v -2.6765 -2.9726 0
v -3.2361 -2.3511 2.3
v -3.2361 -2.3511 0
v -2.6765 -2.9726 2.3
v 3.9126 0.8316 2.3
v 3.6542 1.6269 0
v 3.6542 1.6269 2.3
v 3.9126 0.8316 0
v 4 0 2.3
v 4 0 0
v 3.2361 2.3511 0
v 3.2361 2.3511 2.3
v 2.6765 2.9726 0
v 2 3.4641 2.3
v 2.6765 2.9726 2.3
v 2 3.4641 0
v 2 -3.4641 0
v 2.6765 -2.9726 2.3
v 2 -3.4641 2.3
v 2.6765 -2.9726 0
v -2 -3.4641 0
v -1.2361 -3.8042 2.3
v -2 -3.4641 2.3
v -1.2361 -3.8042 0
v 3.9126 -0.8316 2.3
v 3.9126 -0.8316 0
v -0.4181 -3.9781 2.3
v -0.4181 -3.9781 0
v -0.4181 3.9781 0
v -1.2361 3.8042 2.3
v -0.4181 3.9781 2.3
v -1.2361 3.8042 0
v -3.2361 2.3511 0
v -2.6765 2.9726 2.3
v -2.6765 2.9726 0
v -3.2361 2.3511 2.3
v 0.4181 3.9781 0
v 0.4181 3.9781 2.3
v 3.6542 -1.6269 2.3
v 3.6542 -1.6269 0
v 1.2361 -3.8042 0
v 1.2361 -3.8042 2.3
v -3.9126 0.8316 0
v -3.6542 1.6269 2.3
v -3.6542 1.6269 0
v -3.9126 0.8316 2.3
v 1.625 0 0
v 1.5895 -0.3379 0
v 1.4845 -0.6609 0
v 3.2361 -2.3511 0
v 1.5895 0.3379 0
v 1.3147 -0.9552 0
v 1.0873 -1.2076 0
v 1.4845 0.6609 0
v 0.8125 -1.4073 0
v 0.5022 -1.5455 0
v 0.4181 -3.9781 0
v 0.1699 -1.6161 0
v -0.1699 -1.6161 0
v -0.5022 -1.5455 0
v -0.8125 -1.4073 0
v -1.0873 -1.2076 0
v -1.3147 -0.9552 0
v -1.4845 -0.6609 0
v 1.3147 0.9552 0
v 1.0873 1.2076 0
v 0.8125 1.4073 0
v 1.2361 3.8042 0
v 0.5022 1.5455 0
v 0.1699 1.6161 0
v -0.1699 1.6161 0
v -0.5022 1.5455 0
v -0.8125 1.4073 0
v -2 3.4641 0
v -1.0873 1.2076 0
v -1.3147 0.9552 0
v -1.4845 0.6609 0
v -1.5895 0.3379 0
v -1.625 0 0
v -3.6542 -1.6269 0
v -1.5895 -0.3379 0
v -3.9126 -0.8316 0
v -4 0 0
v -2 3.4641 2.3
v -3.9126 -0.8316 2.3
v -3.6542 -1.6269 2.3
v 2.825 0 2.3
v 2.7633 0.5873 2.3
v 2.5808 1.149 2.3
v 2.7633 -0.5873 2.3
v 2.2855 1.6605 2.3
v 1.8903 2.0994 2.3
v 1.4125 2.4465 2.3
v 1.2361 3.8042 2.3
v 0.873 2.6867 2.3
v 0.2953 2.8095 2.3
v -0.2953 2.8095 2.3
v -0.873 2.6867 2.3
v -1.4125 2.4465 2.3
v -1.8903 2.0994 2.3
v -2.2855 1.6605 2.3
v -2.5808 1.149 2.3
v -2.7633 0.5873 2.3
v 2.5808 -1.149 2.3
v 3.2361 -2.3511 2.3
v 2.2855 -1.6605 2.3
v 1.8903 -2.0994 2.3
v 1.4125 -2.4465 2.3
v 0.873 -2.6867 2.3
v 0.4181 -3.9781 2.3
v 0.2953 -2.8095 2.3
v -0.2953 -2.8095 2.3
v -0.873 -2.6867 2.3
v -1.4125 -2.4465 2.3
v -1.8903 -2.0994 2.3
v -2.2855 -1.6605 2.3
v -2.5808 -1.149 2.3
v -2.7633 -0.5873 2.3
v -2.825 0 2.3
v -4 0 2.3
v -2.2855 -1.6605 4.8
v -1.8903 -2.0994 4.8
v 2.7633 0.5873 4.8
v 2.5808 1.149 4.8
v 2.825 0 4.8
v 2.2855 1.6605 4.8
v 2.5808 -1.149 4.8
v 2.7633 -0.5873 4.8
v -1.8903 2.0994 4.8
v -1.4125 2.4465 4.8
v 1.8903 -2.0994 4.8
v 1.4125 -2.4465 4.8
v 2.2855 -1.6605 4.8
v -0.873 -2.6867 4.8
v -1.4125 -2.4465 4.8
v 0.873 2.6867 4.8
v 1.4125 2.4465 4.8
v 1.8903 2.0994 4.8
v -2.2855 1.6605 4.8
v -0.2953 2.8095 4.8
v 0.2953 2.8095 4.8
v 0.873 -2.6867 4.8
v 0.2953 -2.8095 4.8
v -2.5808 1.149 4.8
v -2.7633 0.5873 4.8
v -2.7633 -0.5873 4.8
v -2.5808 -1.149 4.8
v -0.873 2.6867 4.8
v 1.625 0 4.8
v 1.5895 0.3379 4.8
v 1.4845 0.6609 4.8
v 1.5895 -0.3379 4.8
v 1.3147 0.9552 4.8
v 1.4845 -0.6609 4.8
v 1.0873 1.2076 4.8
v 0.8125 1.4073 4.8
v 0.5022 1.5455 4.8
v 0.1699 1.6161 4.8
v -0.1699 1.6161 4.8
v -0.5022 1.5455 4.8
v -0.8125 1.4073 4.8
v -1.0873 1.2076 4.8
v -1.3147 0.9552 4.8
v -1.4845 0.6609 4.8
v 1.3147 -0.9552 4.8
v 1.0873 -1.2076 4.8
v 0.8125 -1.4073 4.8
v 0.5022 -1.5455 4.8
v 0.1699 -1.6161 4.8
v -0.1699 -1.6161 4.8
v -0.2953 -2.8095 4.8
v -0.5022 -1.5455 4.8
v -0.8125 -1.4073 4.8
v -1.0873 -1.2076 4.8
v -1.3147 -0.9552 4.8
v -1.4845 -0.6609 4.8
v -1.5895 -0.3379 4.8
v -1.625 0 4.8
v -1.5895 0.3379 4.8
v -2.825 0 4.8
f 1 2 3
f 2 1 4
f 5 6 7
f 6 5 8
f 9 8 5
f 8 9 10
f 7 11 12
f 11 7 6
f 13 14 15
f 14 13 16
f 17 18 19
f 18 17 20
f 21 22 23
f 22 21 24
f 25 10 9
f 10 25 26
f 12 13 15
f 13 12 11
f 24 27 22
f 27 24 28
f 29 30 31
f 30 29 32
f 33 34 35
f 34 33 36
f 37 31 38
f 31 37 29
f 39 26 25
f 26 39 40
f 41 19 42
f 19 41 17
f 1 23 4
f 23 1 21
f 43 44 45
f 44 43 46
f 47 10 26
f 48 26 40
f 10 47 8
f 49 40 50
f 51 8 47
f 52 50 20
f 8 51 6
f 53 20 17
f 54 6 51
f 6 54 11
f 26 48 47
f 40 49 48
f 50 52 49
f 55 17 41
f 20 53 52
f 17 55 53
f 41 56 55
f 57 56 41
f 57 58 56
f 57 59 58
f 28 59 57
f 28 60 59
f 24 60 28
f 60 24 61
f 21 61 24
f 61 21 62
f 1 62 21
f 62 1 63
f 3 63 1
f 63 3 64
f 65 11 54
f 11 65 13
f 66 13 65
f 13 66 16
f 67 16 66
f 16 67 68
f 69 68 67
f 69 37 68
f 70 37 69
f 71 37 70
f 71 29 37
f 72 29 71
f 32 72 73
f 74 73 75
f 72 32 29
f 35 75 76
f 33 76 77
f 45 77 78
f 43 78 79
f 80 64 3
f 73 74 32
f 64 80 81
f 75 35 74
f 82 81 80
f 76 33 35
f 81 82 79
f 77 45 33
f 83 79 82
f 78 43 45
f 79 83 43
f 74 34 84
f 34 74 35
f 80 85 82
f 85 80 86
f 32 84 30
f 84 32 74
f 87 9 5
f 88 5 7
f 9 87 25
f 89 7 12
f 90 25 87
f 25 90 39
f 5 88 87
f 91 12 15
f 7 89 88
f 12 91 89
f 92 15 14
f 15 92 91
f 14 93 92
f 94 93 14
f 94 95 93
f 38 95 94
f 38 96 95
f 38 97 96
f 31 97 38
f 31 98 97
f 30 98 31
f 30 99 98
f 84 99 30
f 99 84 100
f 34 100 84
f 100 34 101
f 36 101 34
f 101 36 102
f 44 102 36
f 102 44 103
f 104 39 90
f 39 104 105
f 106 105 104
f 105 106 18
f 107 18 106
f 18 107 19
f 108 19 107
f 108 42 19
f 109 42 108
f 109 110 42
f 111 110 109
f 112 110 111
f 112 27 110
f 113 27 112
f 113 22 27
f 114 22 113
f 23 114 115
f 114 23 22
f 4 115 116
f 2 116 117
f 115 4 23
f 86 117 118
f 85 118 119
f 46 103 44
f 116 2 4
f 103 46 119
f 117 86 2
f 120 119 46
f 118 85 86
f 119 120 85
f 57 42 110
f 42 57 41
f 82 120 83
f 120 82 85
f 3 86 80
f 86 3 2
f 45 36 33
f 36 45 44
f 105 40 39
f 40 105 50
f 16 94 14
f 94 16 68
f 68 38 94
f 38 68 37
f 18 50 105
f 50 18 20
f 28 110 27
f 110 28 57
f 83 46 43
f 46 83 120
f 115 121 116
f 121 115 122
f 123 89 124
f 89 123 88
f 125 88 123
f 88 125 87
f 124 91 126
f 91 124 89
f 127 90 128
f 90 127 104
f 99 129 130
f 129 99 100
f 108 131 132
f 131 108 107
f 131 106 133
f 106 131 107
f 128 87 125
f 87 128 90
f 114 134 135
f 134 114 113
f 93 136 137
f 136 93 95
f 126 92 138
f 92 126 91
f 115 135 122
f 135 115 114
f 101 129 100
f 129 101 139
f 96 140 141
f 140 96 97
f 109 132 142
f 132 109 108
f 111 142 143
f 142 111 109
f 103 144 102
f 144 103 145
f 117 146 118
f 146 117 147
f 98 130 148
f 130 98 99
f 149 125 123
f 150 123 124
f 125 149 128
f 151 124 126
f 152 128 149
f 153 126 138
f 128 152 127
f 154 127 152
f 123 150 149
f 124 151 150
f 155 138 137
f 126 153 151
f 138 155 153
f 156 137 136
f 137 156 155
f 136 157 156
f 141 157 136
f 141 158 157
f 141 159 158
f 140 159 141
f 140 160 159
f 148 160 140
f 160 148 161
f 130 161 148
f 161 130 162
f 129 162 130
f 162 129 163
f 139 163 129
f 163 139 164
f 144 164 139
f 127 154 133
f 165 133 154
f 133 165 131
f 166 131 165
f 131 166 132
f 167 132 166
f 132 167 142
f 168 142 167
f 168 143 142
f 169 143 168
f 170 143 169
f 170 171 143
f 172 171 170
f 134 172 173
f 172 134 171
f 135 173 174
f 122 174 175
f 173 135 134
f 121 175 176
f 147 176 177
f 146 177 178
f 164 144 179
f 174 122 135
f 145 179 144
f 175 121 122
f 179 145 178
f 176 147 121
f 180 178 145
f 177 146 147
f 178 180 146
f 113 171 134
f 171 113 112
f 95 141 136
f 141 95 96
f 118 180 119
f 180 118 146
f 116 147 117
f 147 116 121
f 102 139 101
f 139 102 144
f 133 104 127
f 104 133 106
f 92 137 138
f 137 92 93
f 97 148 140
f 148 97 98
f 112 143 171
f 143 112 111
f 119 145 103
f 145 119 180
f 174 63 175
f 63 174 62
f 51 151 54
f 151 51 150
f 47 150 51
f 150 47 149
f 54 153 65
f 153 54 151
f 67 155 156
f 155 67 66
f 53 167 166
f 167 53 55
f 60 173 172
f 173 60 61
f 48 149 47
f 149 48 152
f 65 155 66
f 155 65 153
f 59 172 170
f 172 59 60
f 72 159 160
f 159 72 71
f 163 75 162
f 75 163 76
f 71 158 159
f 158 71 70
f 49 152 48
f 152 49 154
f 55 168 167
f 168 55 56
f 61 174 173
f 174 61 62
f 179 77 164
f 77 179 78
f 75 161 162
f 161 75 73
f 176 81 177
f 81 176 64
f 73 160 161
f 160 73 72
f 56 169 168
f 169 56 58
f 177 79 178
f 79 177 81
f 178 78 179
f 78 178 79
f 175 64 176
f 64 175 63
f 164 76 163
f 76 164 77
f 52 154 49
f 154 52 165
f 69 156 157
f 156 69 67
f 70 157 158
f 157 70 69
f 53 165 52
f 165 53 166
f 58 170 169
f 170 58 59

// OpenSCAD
// file: axle.scad
include <../settings.scad>;

module make_axle_a(){

    h = track_wheel_width/2 - 0.2;

    difference(){
        union(){
            // main body
            // this should be slightly smaller than the hole on the idler wheel
            cylinder(
                d=track_wheel_hole_radius*2-2,
                h=h-motor_bearing_thickness);
            
            // nub sticking out to center the bearing
            // this should be slightly smaller than the hole on the bearing
            cylinder(d=track_axle_bearing_diameter-0.2, h=h);
        }
        // axle hole
        cylinder(
            d=screw_thread_diameter+tolerance*1.5,
            h=track_wheel_gap*2, center=true);
    }
}

module make_axle_b(){

    h = track_wheel_width_buffer;

    difference(){
        union(){
            // main body
            // this should be slightly larger than the hole on the idler wheel
            cylinder(
                d=track_wheel_hole_radius*2+2,
                h=h/2);
            
            // nub sticking out to center the bearing
            // this should be slightly smaller than the hole on the idler wheel
            cylinder(
                d=track_wheel_hole_radius*2-2,
                h=h);
        }
        // axle hole
        cylinder(
            d=screw_thread_diameter+tolerance*1.5,
            h=track_wheel_gap*2, center=true);
    }
}


make_axle_a();

//translate([0,15,0]) make_axle_b();
// file: ../settings.scad
// Common settings used by all scad files.

// ALL UNITS IN MILLIMETERS (MM)!!!

$fn = 30;//low-res but fast to render
//$fn = 50;//higher-res but slow to render

pi = 3.1415926535897932384626433832795;

max_footprint = 150; // 15x15 cm

bottom_clearance = 10;
bottom_clearance = 25.4/2+10;
//bottom_clearance = 30;

shell_alpha = 0.215;
//shell_alpha = 1.0;

tolerance = 0.5;

// Flat countersunk M2.5mm x 0.45mm machine screw.
screw_thread_diameter = 2.5;//2.8;//2.75;//2.4?
screw_thread_length = 5;//?
screw_head_diameter = 4.75; // M2.5
//screw_head_diameter = 5.2; // M3
screw_head_height = 1.5;//2;

screw_thread_diameter2 = 2;

unit_thickness = 5;
u = unit_thickness;

shell_thickness = unit_thickness;

// Show flags.
show_platform = 0;
show_head = 1;
show_head_shell = 0;
show_head_electronics_bb = 0;
show_battery = 1;
show_foot_cube = 0;
show_torso = 0;
show_motor = 0;
show_motor_plates = 1;
show_motor_inner_plates = 1;
show_motor_outer_plates = 1;
show_wheel = 0;//obsolete
show_tracks = 1;//
show_track_wheels = 1;
show_caster = 0;
show_rpi = 1;
show_vertical_plates = 1;//
show_horizontal_plates = 1;//
show_caster_plates = 0;//obsolete?
show_camera = 1;
show_screen = 0;
show_edge_mount = 1;
show_sonar_mount = 1;
show_recharge_mount = 1;
show_conduit = 1;
show_torso_shell = 1;
show_recharge_dock = 0;
show_head_tilt_axis = 0;
show_rpi_camera_axis = 0;
show_laser_axis = 0;

head_vertical_angle_tilt = 0;
//head_vertical_angle_tilt = 30;//max
//head_vertical_angle_tilt = 10;

torso_height = 120+20;

base_plate_diameter = max_footprint-unit_thickness*2;
base_plate_frame = 0;

head_height = 50;
head_offset_z = max_footprint/2;
head_middle_cutout = 85;

rpi_with_four_hats_and_clearance = 76;

qrd1114_w = 6.10;
qrd1114_l = 4.39;
qrd1114_h = 4.65;

dock_radius = 10;
dock_gripper_border = 2;
dock_gripper_instep = 0.9;
dock_gripper_cutout_tapper = 50;
dock_receiver_height = 5;

// Patriod Fuel+ 9000 mAh
battery_length = 90;
battery_width = 57;
battery_height = 23;
battery_offset_z = 30;//4;

wheel_diameter = 50;
wheel_offset_x = 65;
wheel_offset_z = wheel_diameter/2;
wheel_axle_diameter = 5;

//caster_diameter = 19.05; // 0.75 inches
caster_diameter = 25.45; // 1 inches
//caster_diameter = 15.875; // 5/8 inches
caster_holder_diameter = 30;//31;
caster_offset_y = base_plate_diameter/2 - caster_holder_diameter/2;

arduino_offset_x = 0;
arduino_offset_y = 0;
arduino_offset_z = 67;
arduino_offset_x2 = 0;
arduino_offset_y2 = -20;
arduino_offset_z2 = torso_height+bottom_clearance;

horizontal_plate_width = unit_thickness*8*2 - unit_thickness*2;
horizontal_plate_depth = unit_thickness*8*2;

vertical_plate_width = horizontal_plate_depth;
vertical_plate_height = unit_thickness*8;
vertical_plate_offset_x = wheel_offset_x-22.5;
vertical_plate_offset_z = vertical_plate_height/2 + unit_thickness/2;

vertical_battery_plate_height = 100 - 15;

caster_plate_width = horizontal_plate_width + unit_thickness*2;
caster_plate_mount_length = unit_thickness*4;
caster_plate_width_minor = caster_holder_diameter;

motor_switch_length = 20;
motor_switch_thickness = 6.5;
motor_switch_height = 11;
motor_switch_height_leads = 23;
motor_switch_on_height =  13.3;
motor_switch_hole_diameter = 2.5;
motor_switch_hole_offset_z = 6.5;//this plus diameter/2 is hole center from switch top
motor_switch_hole_spacing = 7.1;// holes are diameter/2 from this

motor_length = 60;
motor_width = 25;
motor_collar_width = 7;
motor_collar_height = 2.5;
motor_axle_width = 4;
motor_axle_height = 9.5;
motor_offset_x = 10;
//motor_offset_y = motor_width/2+5;
motor_offset_y = unit_thickness*3.5;
motor_offset_z = vertical_plate_height/2 - unit_thickness/2;//4;//30;
motor_mount_holes_dist = 17;
// motor countersink hole
motor_mount_holes_width = 3; // M3
motor_mount_holes_head_height = 2.2;
motor_mount_holes_head_width = 5.8;
motor_bearing_outer_diameter = 10;
motor_bearing_inner_diameter = 5.95;
motor_bearing_thickness = 2.5;

motor_unimount_idler_axle_d = screw_thread_diameter;
//motor_unimount_spacer_depth = 0.1;//too small
motor_unimount_spacer_depth = 0.5;

motor_arm_offset_y = -u*3;
motor_arm_offset_z = u*.5;

motor_plate_width = vertical_plate_width;
motor_plate_height = vertical_plate_height;
motor_plate_thickness = unit_thickness;
motor_plate_offset_z = vertical_plate_offset_z;

motor_plate_middle_thickness = 5;

wheel_hub_offset = u*3;

motor_hole_height_offset = -5;

nylon_spacer_outer_diameter = 6.35;
nylon_spacer_inner_diameter = 3.302;
nylon_spacer_length = 12.7;

track_width = unit_thickness*3;
track_offset_x = -50;
track_offset_z = .1;
//track_wheel_radius = 19;//original
track_wheel_radius = 14;
//track_wheel_hole_radius = (nylon_spacer_outer_diameter+1)/2;
track_wheel_hole_radius = motor_bearing_outer_diameter/2;

track_driver_hole_radius = (motor_axle_width)/2 + 0.1;
track_driver_set_screw_head_d = 4.1;
track_driver_set_screw_shaft_d = 2.4;
//track_wheel_width = 13.5;//original
track_wheel_width = u*2;
track_wheel_width_buffer = u*0.25;
track_offset = 3;        //distance from chassis
track_wheel_offset = track_offset;
//track_length = 250; // see tread_triangle.py, too big
//track_length = 240; // see tread_triangle.py
//track_length = 238; //inc/dec in 10 unit increments so notches match idlers
track_length = 228; //inc/dec in 10 unit increments so notches match idlers
track_radius = track_length/2/pi;
track_wheel_show_fancy = 1;
track_wheel_gap = track_wheel_width + track_wheel_width_buffer*2;
track_axle_bearing_diameter = motor_bearing_inner_diameter - 0.1;
track_tensioner_radius = 12;
track_nut_height = 3.5; //TODO
track_punchout_thickness = 0.25;//should be the same as the minimum layer thickness

head_slew_bearing_outer_diameter = 115;
head_slew_bearing_ring_thickness = 20;
head_slew_bearing_inner_diameter = head_slew_bearing_outer_diameter - head_slew_bearing_ring_thickness;
//head_slew_bearing_hole_diameter = head_slew_bearing_inner_diameter - head_slew_bearing_ring_thickness;
head_slew_bearing_hole_diameter = 12+tolerance; // slip ring https://www.adafruit.com/products/775
//head_slew_bearing_ball_diameter = 5;
head_slew_bearing_ball_diameter = 2.5; //u/2;
head_slew_bearing_height = u;//head_slew_bearing_ball_diameter*2;
head_slew_bearing_gap = 0.5;
head_slew_bearing_slew_gap = 0;
head_slew_bearing_gap_factor = 0.1;

neck_strut_width = u*7;
neck_strut_height = u*18;
neck_strut_spacing = u*8;

show_outer_race = 0;
show_inner_race_a = 1;
show_inner_race_b = 1;
show_balls = 0;
// main file
include <../settings.scad>;
use <axle.scad>;

make_axle_a();
